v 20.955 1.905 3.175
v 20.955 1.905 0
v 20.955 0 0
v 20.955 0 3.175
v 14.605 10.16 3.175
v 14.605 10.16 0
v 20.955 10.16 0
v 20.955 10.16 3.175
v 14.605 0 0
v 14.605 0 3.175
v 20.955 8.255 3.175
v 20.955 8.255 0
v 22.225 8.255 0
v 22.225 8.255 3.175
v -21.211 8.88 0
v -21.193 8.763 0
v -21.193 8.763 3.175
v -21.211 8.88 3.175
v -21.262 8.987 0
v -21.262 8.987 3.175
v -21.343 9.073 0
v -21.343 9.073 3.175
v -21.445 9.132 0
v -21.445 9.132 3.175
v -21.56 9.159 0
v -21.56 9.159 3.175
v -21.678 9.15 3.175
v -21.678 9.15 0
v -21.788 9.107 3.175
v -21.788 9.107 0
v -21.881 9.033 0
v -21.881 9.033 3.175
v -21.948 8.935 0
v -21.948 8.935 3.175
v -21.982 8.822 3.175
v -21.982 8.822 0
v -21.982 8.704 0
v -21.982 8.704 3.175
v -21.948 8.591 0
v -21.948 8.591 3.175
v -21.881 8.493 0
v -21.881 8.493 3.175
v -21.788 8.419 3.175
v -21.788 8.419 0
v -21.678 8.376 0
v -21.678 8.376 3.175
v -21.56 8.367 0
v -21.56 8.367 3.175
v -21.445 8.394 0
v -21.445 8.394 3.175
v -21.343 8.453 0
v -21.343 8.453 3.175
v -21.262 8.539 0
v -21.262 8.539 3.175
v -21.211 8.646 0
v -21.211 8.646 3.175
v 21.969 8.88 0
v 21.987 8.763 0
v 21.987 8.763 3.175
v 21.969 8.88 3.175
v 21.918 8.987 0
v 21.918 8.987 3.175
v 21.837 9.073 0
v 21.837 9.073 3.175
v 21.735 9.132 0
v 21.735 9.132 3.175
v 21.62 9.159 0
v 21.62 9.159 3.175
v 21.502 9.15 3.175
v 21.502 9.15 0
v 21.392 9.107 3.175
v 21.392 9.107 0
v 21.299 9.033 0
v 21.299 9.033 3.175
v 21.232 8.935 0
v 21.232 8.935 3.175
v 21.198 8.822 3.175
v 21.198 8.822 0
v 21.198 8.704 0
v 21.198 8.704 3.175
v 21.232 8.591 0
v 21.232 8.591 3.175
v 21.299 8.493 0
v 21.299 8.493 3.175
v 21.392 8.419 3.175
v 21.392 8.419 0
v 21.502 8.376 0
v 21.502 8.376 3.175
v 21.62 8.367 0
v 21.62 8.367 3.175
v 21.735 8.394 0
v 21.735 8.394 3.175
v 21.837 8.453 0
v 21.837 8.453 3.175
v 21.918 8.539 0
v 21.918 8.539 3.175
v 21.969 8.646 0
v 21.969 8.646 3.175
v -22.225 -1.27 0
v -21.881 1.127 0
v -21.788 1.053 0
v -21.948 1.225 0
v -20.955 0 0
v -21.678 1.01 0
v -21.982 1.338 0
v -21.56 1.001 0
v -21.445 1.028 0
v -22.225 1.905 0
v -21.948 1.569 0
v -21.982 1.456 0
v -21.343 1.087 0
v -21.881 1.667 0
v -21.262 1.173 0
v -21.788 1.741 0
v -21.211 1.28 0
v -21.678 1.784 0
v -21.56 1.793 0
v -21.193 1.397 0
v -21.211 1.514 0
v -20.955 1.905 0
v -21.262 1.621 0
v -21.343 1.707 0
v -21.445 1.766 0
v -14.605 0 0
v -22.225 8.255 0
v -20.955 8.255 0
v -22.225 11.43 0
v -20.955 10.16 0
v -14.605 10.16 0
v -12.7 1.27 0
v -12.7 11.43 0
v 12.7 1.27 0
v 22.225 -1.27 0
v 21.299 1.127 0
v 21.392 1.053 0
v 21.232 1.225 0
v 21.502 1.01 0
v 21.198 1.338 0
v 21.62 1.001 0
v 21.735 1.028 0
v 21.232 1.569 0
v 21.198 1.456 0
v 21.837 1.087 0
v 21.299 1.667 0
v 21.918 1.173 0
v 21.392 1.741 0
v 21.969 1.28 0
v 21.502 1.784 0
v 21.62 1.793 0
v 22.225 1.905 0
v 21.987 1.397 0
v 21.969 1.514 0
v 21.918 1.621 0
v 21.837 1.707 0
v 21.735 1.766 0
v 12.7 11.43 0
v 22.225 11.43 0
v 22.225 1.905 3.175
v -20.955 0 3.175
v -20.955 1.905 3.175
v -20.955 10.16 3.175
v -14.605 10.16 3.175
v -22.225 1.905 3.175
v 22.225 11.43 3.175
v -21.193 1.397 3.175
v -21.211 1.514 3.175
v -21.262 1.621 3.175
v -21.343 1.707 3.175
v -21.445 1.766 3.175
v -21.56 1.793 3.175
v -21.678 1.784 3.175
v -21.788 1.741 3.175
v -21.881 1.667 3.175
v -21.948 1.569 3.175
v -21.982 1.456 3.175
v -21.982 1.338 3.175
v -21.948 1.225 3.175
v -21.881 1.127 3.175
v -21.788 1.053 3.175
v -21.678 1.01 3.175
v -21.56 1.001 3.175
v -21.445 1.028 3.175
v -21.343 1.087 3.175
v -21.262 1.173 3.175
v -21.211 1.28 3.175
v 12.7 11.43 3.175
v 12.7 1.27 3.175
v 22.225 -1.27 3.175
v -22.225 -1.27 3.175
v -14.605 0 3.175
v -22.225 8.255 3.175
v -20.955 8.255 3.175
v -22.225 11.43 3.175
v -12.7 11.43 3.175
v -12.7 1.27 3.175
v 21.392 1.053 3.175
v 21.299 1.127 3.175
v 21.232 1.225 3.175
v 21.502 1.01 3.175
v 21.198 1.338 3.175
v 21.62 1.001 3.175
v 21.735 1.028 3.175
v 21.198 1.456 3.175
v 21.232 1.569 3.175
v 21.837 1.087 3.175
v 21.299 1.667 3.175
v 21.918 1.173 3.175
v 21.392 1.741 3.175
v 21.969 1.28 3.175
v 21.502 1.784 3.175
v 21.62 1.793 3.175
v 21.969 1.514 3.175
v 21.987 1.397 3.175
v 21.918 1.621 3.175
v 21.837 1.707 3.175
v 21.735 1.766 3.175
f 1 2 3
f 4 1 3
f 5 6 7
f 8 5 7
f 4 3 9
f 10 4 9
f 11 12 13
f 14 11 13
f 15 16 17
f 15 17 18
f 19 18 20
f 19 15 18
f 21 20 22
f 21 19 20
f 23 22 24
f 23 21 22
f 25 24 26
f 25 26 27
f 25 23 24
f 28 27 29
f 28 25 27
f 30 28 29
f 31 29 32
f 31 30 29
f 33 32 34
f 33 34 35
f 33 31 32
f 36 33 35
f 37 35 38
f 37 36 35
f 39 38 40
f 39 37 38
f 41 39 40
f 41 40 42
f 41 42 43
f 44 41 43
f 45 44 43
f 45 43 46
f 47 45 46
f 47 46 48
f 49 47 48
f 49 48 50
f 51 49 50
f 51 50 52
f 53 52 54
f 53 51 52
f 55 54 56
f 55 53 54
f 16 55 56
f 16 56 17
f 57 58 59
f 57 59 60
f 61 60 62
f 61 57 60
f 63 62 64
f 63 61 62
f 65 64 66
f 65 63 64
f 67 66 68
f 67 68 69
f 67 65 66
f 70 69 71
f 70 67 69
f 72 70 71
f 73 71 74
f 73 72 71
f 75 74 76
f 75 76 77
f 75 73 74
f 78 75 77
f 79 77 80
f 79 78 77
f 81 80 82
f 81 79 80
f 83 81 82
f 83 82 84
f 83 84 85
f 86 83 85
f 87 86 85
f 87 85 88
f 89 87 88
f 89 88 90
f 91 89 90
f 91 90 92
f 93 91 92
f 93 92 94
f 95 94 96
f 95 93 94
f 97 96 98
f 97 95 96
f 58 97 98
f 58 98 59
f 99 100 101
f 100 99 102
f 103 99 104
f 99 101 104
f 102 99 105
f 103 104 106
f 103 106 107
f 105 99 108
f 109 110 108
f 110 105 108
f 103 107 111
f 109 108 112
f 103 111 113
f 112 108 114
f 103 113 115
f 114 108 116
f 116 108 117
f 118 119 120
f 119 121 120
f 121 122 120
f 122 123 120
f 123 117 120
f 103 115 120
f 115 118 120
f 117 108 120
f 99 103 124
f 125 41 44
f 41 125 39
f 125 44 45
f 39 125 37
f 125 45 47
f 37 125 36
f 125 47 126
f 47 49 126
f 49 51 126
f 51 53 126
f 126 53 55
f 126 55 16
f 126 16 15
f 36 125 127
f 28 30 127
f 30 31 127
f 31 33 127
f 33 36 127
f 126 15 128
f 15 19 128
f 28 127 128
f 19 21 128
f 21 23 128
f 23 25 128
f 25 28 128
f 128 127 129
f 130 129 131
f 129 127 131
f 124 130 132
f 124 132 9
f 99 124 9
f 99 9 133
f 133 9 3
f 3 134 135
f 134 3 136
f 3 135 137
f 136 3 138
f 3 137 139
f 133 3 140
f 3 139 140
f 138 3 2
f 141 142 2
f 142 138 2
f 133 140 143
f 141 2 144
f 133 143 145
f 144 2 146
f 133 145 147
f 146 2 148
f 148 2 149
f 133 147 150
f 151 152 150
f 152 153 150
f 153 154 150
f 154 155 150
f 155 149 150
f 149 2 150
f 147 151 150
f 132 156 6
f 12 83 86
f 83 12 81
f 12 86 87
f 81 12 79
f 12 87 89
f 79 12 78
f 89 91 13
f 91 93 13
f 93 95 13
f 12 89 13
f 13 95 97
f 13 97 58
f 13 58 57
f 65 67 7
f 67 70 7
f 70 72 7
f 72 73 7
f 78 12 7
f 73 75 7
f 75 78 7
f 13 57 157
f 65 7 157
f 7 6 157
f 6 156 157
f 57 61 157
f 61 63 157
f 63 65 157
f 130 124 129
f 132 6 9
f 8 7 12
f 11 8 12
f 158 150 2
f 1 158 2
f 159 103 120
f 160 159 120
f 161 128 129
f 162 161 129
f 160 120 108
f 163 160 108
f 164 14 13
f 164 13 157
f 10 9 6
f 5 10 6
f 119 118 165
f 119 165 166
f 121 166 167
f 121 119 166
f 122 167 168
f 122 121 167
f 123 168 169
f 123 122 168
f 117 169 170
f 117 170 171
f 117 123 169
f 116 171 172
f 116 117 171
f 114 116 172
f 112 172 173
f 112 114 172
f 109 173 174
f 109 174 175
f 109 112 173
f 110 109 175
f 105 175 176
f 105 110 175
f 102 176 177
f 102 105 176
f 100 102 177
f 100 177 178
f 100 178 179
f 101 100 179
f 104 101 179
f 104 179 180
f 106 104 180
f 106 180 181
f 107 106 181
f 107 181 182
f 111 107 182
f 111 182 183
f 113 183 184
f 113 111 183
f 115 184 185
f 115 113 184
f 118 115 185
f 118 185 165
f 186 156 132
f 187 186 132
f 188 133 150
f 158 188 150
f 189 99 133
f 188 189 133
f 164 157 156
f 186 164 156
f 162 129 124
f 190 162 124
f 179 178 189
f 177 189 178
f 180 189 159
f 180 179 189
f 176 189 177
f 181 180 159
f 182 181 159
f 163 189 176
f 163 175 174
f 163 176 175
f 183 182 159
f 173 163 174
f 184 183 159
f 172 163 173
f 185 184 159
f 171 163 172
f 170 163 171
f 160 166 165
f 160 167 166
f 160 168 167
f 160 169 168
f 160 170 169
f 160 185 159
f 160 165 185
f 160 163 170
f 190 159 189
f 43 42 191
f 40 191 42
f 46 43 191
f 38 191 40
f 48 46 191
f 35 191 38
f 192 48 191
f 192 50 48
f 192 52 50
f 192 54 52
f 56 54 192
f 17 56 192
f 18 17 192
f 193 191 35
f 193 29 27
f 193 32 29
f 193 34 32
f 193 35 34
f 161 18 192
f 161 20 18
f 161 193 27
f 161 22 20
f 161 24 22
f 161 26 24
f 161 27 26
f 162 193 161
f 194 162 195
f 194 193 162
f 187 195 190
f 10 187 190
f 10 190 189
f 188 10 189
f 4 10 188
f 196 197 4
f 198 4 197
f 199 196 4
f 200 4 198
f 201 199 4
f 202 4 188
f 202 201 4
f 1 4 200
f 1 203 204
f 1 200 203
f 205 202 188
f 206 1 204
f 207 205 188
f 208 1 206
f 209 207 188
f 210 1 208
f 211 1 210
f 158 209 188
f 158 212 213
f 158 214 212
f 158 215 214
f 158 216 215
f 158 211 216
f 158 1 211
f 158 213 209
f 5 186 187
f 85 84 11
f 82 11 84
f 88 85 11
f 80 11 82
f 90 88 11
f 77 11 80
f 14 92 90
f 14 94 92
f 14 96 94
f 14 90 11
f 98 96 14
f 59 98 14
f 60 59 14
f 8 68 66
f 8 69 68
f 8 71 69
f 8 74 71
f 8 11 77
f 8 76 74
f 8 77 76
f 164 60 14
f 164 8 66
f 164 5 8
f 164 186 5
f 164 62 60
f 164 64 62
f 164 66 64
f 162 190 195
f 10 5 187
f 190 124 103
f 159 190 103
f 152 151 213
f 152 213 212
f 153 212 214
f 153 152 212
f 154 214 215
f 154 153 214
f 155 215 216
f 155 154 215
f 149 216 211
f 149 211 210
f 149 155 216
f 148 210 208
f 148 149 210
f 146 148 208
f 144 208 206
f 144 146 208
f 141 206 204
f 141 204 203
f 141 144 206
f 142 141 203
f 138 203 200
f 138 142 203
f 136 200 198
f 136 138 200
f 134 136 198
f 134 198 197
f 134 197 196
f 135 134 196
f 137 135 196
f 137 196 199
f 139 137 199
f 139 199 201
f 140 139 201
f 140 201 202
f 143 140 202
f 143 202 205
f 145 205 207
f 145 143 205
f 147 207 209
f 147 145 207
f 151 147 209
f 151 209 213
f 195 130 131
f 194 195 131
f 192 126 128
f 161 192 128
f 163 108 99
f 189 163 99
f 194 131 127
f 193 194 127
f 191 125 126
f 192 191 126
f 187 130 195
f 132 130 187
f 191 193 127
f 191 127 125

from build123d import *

# Parameters (mm, degrees)
F0_R     = 0.396875
F0_W     = 25.4
F0_H     = 2.54
F1_DEPTH = 3.175


# Not quite as in the source:
# - a feature names something its author has since deleted; it is built from what else it names


with BuildPart() as f1:
    # F0 (on Top) → F1 (new body)
    with BuildSketch(Plane.XY):
        Polygon((-12.7, 11.43), (-22.225, 11.43), (-22.225, 8.255), (-20.955, 8.255), (-20.955, 10.16), (-14.605, 10.16), (-14.605, 0), (-20.955, 0), (-20.955, 1.905), (-22.225, 1.905), (-22.225, -1.27), (-12.7, -1.27), (-12.7, 1.27), align=None)
        with Locations((-21.59, 1.397)):
            Circle(F0_R, mode=Mode.SUBTRACT)
        with Locations((-21.59, 8.763)):
            Circle(F0_R, mode=Mode.SUBTRACT)
        Rectangle(F0_W, F0_H)
        Polygon((12.7, 11.43), (12.7, 1.27), (12.7, -1.27), (22.225, -1.27), (22.225, 1.905), (20.955, 1.905), (20.955, 0), (14.605, 0), (14.605, 10.16), (20.955, 10.16), (20.955, 8.255), (22.225, 8.255), (22.225, 11.43), align=None)
        with Locations((21.59, 1.397)):
            Circle(F0_R, mode=Mode.SUBTRACT)
        with Locations((21.59, 8.763)):
            Circle(F0_R, mode=Mode.SUBTRACT)
    extrude(amount=F1_DEPTH)


solid = f1.part
